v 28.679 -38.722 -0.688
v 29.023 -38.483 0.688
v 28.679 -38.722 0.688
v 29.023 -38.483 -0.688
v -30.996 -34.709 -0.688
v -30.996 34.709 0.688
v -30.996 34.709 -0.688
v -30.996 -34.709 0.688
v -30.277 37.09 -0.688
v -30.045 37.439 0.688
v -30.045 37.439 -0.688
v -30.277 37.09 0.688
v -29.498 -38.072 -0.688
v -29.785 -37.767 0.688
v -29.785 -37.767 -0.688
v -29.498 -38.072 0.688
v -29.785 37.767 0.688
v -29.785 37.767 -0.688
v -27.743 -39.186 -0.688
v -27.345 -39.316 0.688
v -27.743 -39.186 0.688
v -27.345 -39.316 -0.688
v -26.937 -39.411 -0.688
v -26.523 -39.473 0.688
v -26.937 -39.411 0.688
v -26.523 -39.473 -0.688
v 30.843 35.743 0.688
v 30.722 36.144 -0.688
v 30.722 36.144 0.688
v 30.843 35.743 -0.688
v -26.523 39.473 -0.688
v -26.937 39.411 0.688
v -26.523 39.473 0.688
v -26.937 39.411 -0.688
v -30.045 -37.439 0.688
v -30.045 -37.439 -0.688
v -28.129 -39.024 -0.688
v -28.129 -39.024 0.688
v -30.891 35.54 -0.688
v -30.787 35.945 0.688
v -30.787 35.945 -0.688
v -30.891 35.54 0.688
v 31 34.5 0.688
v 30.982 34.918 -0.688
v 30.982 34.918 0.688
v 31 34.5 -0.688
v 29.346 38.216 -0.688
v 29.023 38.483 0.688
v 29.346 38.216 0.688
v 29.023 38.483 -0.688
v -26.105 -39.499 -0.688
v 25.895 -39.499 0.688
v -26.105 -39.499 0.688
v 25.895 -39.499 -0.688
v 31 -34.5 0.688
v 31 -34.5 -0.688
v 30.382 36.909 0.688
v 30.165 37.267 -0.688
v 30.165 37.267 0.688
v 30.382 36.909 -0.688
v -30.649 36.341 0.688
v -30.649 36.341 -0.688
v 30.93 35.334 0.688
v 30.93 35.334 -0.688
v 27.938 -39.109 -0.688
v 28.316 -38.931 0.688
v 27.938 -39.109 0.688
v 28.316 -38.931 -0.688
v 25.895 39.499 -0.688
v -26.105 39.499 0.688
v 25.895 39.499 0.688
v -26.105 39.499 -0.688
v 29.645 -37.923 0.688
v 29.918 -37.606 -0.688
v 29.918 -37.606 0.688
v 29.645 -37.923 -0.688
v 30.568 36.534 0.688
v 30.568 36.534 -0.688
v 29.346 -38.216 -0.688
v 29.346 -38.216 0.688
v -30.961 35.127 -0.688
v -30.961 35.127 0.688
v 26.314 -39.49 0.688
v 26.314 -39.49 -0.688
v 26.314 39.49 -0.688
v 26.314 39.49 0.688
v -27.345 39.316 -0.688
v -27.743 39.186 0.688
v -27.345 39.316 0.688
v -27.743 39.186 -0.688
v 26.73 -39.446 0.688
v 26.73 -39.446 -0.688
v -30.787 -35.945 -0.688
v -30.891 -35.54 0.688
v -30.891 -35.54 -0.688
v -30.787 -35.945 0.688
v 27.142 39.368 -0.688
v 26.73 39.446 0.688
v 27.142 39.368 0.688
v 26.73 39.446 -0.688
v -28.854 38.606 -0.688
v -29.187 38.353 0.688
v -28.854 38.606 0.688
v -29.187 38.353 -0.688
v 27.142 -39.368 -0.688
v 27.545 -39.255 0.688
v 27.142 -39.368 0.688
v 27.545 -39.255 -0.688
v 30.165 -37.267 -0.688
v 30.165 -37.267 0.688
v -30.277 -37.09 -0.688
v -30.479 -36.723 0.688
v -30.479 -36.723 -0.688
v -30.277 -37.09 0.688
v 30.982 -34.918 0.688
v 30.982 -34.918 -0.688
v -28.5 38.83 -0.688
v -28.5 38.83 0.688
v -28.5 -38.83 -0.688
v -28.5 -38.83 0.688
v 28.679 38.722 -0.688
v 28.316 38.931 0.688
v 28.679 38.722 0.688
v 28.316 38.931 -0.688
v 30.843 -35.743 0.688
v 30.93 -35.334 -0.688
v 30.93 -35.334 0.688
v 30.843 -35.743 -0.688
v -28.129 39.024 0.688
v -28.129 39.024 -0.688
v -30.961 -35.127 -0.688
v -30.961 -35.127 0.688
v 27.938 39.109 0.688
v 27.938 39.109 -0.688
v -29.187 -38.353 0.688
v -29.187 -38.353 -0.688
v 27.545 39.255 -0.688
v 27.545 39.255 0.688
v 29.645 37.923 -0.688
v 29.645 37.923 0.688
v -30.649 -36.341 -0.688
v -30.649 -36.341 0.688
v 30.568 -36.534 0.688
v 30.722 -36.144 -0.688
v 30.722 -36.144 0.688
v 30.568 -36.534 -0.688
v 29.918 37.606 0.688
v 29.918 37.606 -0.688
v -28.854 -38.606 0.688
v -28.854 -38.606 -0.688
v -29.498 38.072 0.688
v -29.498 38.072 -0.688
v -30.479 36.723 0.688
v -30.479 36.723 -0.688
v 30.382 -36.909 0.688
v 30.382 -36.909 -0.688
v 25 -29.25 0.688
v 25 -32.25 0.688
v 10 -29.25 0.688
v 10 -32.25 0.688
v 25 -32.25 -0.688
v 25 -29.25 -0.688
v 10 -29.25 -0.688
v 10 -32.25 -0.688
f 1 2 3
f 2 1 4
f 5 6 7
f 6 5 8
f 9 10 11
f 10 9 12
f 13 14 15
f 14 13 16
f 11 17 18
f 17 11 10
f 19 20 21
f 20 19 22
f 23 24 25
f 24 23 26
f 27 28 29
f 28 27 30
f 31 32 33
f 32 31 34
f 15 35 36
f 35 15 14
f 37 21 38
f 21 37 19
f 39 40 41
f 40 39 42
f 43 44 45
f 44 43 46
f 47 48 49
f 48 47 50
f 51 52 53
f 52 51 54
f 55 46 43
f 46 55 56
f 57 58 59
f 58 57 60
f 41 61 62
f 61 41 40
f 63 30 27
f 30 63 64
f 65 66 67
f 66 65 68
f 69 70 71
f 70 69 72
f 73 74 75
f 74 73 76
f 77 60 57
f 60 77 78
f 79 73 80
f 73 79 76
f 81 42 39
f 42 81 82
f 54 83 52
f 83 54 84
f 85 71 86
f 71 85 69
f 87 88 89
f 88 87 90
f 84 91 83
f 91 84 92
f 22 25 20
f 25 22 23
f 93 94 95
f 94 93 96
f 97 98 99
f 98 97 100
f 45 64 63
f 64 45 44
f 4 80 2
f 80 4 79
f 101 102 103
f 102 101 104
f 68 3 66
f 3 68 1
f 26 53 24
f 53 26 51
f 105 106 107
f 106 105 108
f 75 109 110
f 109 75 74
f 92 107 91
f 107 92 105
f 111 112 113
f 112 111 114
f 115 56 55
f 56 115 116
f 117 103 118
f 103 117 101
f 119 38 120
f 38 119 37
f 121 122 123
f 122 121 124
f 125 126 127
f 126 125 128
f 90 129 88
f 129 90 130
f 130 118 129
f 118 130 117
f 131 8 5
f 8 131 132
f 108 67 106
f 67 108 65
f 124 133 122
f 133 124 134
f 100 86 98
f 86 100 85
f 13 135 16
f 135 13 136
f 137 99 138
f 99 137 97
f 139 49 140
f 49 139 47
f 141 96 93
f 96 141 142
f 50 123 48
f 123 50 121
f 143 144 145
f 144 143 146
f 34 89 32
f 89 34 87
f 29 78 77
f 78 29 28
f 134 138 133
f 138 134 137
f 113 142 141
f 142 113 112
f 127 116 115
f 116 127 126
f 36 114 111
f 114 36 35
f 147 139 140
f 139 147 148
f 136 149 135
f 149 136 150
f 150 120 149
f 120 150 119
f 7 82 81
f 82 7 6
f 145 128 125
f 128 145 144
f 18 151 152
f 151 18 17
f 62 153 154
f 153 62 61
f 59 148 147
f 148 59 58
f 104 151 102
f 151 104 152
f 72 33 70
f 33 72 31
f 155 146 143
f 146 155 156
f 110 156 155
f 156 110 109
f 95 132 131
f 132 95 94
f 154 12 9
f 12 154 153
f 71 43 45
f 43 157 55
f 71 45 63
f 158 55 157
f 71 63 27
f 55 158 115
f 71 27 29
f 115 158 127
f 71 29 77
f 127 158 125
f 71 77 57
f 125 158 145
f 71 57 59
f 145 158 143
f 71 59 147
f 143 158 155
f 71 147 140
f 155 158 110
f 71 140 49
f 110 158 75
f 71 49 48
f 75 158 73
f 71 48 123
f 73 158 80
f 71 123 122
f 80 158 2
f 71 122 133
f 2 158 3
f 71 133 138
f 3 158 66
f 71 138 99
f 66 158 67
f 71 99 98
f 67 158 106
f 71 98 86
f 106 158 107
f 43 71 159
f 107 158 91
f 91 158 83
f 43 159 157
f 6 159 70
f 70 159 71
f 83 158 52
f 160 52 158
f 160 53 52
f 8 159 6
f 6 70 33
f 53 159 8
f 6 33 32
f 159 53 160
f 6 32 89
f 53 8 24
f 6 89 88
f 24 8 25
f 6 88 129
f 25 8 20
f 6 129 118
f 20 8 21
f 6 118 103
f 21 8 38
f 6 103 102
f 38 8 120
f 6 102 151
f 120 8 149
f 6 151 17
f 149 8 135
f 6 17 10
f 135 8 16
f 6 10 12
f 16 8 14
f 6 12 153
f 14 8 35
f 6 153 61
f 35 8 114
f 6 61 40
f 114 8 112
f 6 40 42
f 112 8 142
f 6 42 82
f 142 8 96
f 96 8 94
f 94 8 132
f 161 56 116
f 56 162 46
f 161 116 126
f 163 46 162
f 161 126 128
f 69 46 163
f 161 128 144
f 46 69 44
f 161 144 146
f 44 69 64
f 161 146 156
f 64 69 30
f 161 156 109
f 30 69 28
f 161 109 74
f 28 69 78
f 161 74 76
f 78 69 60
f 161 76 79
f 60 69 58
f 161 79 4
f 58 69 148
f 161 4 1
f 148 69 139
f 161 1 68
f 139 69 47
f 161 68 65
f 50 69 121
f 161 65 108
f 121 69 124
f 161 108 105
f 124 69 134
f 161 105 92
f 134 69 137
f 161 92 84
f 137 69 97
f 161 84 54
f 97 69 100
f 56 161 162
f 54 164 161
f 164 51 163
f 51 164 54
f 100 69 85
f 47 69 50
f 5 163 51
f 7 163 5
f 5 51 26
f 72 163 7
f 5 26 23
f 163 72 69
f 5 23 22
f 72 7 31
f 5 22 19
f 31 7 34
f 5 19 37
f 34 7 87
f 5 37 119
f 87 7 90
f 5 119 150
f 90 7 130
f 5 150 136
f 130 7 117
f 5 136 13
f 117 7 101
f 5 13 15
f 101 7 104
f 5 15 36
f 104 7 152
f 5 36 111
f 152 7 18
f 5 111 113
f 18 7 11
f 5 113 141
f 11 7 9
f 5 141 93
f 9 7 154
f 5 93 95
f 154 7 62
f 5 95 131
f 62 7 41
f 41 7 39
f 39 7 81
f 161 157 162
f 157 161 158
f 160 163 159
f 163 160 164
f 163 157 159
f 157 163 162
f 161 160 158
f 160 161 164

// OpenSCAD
// file: ../roundedcube.scad
// Higher definition curves
$fs = 0.01;

module roundedcube(size = [1, 1, 1], center = false, radius = 0.5, apply_to = "all") {
	// If single value, convert to [x, y, z] vector
	size = (size[0] == undef) ? [size, size, size] : size;

	translate_min = radius;
	translate_xmax = size[0] - radius;
	translate_ymax = size[1] - radius;
	translate_zmax = size[2] - radius;

	diameter = radius * 2;

	module build_point(type = "sphere", rotate = [0, 0, 0]) {
		if (type == "sphere") {
			sphere(r = radius);
		} else if (type == "cylinder") {
			rotate(a = rotate)
			cylinder(h = diameter, r = radius, center = true);
		}
	}

	obj_translate = (center == false) ?
		[0, 0, 0] : [
			-(size[0] / 2),
			-(size[1] / 2),
			-(size[2] / 2)
		];

	translate(v = obj_translate) {
		hull() {
			for (translate_x = [translate_min, translate_xmax]) {
				x_at = (translate_x == translate_min) ? "min" : "max";
				for (translate_y = [translate_min, translate_ymax]) {
					y_at = (translate_y == translate_min) ? "min" : "max";
					for (translate_z = [translate_min, translate_zmax]) {
						z_at = (translate_z == translate_min) ? "min" : "max";

						translate(v = [translate_x, translate_y, translate_z])
						if (
							(apply_to == "all") ||
							(apply_to == "xmin" && x_at == "min") || (apply_to == "xmax" && x_at == "max") ||
							(apply_to == "ymin" && y_at == "min") || (apply_to == "ymax" && y_at == "max") ||
							(apply_to == "zmin" && z_at == "min") || (apply_to == "zmax" && z_at == "max")
						) {
							build_point("sphere");
						} else {
							rotate =
								(apply_to == "xmin" || apply_to == "xmax" || apply_to == "x") ? [0, 90, 0] : (
								(apply_to == "ymin" || apply_to == "ymax" || apply_to == "y") ? [90, 90, 0] :
								[0, 0, 0]
							);
							build_point("cylinder", rotate);
						}
					}
				}
			}
		}
	}
}

module roundedcubez(size = [1, 1, 1], center = false, radius = 0.5, apply_to = "all") {
	intersection() {
		roundedcube(size, center, radius, apply_to="z");
		scale([1.0, 1.0, 1.1])
			cube(size, center);
	}
}

// The good stuff!!!!  Forget about the whack stuff above.
// centered on XY only
module cube_(size=[1, 1, 1])
	translate([-size[0] / 2, -size[1] / 2, 0])
		cube(size);

// centered on XY only
module roundedcubez_(size = [1, 1, 1], radius = 0.5) {
	linear_extrude(height=size[2]) {
		square([size[0] - 2 * radius, size[1]], center=true);
		square([size[0], size[1] - 2 * radius], center=true);
		for (i=[-1, 1])
			for (j=[-1, 1])
				translate([i * (size[0] / 2 - radius), j * (size[1] / 2 - radius), 0])
					circle(r = radius);
	}
}
// main file
// for the big one, found in 03/2023

$fn=75;

include <../roundedcube.scad>

// TODO confirm dimension
w_batt = 61;
h_batt = 78;
t_batt = 38;

// Make it a multiple of nozzle size
t_wall = 1.8;

// corner radius
rad = 5.0;

// thickness of the PCB holder
pcb_t = 7;

// PCB position
h_pcb = 72.5;
w_pcb = 27;
pcb_x = w_batt / 2 - w_pcb / 2;
pcb_y = -h_batt / 2 + h_pcb / 2;
pcb_z = pcb_t / 2 + t_batt / 2 + 0.01;

// thickness of the top and bottom denim-lined plates
h_plates = 1.25;
t_denim = 0.75;
plate_z = t_batt / 2 + h_plates / 2 + pcb_t + t_denim;

module batt() {
    // color("green") {
    //     translate([12.0, 4, t_batt / 2 + 3])
    //         cube(size=[32.5, 65, 6], center=true);
    // }
    color("grey")
        cube(size=[w_batt, h_batt, t_batt], center=true);
}


module box() {
    h_box = t_batt + pcb_t + 2 * h_plates + 4 * t_denim;
    translate([0, 0, pcb_t / 2])
        difference() {
            // outer dimensions of box
            roundedcubez(size=[w_batt + 2 * t_wall + rad / 2, h_batt + 2 * t_wall + rad / 2, h_box], radius=rad, center=true);
            // inner dimensions of box
            roundedcubez(size=[w_batt + rad / 2, h_batt + rad / 2, h_box + 1], radius=rad, center=true);
            // bottom notch for lid
            // translate([0, 0, (t_wall - h_box - 0.01) / 2])
            //     cube(size=[w_batt + t_wall, h_batt + t_wall, t_wall], center=true);
            // USB holes
            translate([pcb_x, pcb_y, pcb_z - pcb_t / 2])
                usb_holes();
        }
}


module usb_holes() {
    translate([33 / 2, 72 / 2 - 20, 0]) {
        // cut 2 big USB holes
        for (i = [-1, 1])
            translate([0, i * 10, 0])
                cube(size=[10, 14, 7], center=true);

        // cut USB-C hole
        translate([0, -27.5, -1.25])
            cube(size=[10, 11, 4], center=true);

        // apple hole
        translate([0, -43, 0])
            cube(size=[10, 10, 7], center=true);

        // button hole
        translate([-19, -53, -2])
            rotate([90, 0, 0])
                cylinder(h=10, d=4, center=true);

        // LED holes
        translate([-16, -53 + 9, 10])
            cube(size=[15, 3, 20], center=true);
    }
}


module pcb_holder() {
    difference() {
        roundedcubez(size=[w_batt + rad / 2 - 1, h_batt + rad / 2 - 1, pcb_t], radius=rad, center=true);

        // cavity for PCB
        translate([pcb_x + 5, pcb_y - 5, 0])
            cube(size=[w_pcb + 10, h_pcb + 10, 10], center=true);
    }
}

module denim_plate() {
    difference() {
        roundedcubez(size=[w_batt + rad / 2 - 2 * t_denim, h_batt + rad / 2 - 2 * t_denim, h_plates], radius=rad, center=true);
        translate([pcb_x, pcb_y, -10])
            usb_holes();
    }
}


intersection() {
    union() {
        box();

        color("red")
            batt();

        color("orange")
            for (z = [plate_z, -plate_z + pcb_t])
                translate([0, 0, z])
                    !denim_plate();

        color("blue")
            translate([0, 0, pcb_z])
                pcb_holder();
    }
    translate([0, 0, -75])
        cube([200, 200, 200], center=true);
}
